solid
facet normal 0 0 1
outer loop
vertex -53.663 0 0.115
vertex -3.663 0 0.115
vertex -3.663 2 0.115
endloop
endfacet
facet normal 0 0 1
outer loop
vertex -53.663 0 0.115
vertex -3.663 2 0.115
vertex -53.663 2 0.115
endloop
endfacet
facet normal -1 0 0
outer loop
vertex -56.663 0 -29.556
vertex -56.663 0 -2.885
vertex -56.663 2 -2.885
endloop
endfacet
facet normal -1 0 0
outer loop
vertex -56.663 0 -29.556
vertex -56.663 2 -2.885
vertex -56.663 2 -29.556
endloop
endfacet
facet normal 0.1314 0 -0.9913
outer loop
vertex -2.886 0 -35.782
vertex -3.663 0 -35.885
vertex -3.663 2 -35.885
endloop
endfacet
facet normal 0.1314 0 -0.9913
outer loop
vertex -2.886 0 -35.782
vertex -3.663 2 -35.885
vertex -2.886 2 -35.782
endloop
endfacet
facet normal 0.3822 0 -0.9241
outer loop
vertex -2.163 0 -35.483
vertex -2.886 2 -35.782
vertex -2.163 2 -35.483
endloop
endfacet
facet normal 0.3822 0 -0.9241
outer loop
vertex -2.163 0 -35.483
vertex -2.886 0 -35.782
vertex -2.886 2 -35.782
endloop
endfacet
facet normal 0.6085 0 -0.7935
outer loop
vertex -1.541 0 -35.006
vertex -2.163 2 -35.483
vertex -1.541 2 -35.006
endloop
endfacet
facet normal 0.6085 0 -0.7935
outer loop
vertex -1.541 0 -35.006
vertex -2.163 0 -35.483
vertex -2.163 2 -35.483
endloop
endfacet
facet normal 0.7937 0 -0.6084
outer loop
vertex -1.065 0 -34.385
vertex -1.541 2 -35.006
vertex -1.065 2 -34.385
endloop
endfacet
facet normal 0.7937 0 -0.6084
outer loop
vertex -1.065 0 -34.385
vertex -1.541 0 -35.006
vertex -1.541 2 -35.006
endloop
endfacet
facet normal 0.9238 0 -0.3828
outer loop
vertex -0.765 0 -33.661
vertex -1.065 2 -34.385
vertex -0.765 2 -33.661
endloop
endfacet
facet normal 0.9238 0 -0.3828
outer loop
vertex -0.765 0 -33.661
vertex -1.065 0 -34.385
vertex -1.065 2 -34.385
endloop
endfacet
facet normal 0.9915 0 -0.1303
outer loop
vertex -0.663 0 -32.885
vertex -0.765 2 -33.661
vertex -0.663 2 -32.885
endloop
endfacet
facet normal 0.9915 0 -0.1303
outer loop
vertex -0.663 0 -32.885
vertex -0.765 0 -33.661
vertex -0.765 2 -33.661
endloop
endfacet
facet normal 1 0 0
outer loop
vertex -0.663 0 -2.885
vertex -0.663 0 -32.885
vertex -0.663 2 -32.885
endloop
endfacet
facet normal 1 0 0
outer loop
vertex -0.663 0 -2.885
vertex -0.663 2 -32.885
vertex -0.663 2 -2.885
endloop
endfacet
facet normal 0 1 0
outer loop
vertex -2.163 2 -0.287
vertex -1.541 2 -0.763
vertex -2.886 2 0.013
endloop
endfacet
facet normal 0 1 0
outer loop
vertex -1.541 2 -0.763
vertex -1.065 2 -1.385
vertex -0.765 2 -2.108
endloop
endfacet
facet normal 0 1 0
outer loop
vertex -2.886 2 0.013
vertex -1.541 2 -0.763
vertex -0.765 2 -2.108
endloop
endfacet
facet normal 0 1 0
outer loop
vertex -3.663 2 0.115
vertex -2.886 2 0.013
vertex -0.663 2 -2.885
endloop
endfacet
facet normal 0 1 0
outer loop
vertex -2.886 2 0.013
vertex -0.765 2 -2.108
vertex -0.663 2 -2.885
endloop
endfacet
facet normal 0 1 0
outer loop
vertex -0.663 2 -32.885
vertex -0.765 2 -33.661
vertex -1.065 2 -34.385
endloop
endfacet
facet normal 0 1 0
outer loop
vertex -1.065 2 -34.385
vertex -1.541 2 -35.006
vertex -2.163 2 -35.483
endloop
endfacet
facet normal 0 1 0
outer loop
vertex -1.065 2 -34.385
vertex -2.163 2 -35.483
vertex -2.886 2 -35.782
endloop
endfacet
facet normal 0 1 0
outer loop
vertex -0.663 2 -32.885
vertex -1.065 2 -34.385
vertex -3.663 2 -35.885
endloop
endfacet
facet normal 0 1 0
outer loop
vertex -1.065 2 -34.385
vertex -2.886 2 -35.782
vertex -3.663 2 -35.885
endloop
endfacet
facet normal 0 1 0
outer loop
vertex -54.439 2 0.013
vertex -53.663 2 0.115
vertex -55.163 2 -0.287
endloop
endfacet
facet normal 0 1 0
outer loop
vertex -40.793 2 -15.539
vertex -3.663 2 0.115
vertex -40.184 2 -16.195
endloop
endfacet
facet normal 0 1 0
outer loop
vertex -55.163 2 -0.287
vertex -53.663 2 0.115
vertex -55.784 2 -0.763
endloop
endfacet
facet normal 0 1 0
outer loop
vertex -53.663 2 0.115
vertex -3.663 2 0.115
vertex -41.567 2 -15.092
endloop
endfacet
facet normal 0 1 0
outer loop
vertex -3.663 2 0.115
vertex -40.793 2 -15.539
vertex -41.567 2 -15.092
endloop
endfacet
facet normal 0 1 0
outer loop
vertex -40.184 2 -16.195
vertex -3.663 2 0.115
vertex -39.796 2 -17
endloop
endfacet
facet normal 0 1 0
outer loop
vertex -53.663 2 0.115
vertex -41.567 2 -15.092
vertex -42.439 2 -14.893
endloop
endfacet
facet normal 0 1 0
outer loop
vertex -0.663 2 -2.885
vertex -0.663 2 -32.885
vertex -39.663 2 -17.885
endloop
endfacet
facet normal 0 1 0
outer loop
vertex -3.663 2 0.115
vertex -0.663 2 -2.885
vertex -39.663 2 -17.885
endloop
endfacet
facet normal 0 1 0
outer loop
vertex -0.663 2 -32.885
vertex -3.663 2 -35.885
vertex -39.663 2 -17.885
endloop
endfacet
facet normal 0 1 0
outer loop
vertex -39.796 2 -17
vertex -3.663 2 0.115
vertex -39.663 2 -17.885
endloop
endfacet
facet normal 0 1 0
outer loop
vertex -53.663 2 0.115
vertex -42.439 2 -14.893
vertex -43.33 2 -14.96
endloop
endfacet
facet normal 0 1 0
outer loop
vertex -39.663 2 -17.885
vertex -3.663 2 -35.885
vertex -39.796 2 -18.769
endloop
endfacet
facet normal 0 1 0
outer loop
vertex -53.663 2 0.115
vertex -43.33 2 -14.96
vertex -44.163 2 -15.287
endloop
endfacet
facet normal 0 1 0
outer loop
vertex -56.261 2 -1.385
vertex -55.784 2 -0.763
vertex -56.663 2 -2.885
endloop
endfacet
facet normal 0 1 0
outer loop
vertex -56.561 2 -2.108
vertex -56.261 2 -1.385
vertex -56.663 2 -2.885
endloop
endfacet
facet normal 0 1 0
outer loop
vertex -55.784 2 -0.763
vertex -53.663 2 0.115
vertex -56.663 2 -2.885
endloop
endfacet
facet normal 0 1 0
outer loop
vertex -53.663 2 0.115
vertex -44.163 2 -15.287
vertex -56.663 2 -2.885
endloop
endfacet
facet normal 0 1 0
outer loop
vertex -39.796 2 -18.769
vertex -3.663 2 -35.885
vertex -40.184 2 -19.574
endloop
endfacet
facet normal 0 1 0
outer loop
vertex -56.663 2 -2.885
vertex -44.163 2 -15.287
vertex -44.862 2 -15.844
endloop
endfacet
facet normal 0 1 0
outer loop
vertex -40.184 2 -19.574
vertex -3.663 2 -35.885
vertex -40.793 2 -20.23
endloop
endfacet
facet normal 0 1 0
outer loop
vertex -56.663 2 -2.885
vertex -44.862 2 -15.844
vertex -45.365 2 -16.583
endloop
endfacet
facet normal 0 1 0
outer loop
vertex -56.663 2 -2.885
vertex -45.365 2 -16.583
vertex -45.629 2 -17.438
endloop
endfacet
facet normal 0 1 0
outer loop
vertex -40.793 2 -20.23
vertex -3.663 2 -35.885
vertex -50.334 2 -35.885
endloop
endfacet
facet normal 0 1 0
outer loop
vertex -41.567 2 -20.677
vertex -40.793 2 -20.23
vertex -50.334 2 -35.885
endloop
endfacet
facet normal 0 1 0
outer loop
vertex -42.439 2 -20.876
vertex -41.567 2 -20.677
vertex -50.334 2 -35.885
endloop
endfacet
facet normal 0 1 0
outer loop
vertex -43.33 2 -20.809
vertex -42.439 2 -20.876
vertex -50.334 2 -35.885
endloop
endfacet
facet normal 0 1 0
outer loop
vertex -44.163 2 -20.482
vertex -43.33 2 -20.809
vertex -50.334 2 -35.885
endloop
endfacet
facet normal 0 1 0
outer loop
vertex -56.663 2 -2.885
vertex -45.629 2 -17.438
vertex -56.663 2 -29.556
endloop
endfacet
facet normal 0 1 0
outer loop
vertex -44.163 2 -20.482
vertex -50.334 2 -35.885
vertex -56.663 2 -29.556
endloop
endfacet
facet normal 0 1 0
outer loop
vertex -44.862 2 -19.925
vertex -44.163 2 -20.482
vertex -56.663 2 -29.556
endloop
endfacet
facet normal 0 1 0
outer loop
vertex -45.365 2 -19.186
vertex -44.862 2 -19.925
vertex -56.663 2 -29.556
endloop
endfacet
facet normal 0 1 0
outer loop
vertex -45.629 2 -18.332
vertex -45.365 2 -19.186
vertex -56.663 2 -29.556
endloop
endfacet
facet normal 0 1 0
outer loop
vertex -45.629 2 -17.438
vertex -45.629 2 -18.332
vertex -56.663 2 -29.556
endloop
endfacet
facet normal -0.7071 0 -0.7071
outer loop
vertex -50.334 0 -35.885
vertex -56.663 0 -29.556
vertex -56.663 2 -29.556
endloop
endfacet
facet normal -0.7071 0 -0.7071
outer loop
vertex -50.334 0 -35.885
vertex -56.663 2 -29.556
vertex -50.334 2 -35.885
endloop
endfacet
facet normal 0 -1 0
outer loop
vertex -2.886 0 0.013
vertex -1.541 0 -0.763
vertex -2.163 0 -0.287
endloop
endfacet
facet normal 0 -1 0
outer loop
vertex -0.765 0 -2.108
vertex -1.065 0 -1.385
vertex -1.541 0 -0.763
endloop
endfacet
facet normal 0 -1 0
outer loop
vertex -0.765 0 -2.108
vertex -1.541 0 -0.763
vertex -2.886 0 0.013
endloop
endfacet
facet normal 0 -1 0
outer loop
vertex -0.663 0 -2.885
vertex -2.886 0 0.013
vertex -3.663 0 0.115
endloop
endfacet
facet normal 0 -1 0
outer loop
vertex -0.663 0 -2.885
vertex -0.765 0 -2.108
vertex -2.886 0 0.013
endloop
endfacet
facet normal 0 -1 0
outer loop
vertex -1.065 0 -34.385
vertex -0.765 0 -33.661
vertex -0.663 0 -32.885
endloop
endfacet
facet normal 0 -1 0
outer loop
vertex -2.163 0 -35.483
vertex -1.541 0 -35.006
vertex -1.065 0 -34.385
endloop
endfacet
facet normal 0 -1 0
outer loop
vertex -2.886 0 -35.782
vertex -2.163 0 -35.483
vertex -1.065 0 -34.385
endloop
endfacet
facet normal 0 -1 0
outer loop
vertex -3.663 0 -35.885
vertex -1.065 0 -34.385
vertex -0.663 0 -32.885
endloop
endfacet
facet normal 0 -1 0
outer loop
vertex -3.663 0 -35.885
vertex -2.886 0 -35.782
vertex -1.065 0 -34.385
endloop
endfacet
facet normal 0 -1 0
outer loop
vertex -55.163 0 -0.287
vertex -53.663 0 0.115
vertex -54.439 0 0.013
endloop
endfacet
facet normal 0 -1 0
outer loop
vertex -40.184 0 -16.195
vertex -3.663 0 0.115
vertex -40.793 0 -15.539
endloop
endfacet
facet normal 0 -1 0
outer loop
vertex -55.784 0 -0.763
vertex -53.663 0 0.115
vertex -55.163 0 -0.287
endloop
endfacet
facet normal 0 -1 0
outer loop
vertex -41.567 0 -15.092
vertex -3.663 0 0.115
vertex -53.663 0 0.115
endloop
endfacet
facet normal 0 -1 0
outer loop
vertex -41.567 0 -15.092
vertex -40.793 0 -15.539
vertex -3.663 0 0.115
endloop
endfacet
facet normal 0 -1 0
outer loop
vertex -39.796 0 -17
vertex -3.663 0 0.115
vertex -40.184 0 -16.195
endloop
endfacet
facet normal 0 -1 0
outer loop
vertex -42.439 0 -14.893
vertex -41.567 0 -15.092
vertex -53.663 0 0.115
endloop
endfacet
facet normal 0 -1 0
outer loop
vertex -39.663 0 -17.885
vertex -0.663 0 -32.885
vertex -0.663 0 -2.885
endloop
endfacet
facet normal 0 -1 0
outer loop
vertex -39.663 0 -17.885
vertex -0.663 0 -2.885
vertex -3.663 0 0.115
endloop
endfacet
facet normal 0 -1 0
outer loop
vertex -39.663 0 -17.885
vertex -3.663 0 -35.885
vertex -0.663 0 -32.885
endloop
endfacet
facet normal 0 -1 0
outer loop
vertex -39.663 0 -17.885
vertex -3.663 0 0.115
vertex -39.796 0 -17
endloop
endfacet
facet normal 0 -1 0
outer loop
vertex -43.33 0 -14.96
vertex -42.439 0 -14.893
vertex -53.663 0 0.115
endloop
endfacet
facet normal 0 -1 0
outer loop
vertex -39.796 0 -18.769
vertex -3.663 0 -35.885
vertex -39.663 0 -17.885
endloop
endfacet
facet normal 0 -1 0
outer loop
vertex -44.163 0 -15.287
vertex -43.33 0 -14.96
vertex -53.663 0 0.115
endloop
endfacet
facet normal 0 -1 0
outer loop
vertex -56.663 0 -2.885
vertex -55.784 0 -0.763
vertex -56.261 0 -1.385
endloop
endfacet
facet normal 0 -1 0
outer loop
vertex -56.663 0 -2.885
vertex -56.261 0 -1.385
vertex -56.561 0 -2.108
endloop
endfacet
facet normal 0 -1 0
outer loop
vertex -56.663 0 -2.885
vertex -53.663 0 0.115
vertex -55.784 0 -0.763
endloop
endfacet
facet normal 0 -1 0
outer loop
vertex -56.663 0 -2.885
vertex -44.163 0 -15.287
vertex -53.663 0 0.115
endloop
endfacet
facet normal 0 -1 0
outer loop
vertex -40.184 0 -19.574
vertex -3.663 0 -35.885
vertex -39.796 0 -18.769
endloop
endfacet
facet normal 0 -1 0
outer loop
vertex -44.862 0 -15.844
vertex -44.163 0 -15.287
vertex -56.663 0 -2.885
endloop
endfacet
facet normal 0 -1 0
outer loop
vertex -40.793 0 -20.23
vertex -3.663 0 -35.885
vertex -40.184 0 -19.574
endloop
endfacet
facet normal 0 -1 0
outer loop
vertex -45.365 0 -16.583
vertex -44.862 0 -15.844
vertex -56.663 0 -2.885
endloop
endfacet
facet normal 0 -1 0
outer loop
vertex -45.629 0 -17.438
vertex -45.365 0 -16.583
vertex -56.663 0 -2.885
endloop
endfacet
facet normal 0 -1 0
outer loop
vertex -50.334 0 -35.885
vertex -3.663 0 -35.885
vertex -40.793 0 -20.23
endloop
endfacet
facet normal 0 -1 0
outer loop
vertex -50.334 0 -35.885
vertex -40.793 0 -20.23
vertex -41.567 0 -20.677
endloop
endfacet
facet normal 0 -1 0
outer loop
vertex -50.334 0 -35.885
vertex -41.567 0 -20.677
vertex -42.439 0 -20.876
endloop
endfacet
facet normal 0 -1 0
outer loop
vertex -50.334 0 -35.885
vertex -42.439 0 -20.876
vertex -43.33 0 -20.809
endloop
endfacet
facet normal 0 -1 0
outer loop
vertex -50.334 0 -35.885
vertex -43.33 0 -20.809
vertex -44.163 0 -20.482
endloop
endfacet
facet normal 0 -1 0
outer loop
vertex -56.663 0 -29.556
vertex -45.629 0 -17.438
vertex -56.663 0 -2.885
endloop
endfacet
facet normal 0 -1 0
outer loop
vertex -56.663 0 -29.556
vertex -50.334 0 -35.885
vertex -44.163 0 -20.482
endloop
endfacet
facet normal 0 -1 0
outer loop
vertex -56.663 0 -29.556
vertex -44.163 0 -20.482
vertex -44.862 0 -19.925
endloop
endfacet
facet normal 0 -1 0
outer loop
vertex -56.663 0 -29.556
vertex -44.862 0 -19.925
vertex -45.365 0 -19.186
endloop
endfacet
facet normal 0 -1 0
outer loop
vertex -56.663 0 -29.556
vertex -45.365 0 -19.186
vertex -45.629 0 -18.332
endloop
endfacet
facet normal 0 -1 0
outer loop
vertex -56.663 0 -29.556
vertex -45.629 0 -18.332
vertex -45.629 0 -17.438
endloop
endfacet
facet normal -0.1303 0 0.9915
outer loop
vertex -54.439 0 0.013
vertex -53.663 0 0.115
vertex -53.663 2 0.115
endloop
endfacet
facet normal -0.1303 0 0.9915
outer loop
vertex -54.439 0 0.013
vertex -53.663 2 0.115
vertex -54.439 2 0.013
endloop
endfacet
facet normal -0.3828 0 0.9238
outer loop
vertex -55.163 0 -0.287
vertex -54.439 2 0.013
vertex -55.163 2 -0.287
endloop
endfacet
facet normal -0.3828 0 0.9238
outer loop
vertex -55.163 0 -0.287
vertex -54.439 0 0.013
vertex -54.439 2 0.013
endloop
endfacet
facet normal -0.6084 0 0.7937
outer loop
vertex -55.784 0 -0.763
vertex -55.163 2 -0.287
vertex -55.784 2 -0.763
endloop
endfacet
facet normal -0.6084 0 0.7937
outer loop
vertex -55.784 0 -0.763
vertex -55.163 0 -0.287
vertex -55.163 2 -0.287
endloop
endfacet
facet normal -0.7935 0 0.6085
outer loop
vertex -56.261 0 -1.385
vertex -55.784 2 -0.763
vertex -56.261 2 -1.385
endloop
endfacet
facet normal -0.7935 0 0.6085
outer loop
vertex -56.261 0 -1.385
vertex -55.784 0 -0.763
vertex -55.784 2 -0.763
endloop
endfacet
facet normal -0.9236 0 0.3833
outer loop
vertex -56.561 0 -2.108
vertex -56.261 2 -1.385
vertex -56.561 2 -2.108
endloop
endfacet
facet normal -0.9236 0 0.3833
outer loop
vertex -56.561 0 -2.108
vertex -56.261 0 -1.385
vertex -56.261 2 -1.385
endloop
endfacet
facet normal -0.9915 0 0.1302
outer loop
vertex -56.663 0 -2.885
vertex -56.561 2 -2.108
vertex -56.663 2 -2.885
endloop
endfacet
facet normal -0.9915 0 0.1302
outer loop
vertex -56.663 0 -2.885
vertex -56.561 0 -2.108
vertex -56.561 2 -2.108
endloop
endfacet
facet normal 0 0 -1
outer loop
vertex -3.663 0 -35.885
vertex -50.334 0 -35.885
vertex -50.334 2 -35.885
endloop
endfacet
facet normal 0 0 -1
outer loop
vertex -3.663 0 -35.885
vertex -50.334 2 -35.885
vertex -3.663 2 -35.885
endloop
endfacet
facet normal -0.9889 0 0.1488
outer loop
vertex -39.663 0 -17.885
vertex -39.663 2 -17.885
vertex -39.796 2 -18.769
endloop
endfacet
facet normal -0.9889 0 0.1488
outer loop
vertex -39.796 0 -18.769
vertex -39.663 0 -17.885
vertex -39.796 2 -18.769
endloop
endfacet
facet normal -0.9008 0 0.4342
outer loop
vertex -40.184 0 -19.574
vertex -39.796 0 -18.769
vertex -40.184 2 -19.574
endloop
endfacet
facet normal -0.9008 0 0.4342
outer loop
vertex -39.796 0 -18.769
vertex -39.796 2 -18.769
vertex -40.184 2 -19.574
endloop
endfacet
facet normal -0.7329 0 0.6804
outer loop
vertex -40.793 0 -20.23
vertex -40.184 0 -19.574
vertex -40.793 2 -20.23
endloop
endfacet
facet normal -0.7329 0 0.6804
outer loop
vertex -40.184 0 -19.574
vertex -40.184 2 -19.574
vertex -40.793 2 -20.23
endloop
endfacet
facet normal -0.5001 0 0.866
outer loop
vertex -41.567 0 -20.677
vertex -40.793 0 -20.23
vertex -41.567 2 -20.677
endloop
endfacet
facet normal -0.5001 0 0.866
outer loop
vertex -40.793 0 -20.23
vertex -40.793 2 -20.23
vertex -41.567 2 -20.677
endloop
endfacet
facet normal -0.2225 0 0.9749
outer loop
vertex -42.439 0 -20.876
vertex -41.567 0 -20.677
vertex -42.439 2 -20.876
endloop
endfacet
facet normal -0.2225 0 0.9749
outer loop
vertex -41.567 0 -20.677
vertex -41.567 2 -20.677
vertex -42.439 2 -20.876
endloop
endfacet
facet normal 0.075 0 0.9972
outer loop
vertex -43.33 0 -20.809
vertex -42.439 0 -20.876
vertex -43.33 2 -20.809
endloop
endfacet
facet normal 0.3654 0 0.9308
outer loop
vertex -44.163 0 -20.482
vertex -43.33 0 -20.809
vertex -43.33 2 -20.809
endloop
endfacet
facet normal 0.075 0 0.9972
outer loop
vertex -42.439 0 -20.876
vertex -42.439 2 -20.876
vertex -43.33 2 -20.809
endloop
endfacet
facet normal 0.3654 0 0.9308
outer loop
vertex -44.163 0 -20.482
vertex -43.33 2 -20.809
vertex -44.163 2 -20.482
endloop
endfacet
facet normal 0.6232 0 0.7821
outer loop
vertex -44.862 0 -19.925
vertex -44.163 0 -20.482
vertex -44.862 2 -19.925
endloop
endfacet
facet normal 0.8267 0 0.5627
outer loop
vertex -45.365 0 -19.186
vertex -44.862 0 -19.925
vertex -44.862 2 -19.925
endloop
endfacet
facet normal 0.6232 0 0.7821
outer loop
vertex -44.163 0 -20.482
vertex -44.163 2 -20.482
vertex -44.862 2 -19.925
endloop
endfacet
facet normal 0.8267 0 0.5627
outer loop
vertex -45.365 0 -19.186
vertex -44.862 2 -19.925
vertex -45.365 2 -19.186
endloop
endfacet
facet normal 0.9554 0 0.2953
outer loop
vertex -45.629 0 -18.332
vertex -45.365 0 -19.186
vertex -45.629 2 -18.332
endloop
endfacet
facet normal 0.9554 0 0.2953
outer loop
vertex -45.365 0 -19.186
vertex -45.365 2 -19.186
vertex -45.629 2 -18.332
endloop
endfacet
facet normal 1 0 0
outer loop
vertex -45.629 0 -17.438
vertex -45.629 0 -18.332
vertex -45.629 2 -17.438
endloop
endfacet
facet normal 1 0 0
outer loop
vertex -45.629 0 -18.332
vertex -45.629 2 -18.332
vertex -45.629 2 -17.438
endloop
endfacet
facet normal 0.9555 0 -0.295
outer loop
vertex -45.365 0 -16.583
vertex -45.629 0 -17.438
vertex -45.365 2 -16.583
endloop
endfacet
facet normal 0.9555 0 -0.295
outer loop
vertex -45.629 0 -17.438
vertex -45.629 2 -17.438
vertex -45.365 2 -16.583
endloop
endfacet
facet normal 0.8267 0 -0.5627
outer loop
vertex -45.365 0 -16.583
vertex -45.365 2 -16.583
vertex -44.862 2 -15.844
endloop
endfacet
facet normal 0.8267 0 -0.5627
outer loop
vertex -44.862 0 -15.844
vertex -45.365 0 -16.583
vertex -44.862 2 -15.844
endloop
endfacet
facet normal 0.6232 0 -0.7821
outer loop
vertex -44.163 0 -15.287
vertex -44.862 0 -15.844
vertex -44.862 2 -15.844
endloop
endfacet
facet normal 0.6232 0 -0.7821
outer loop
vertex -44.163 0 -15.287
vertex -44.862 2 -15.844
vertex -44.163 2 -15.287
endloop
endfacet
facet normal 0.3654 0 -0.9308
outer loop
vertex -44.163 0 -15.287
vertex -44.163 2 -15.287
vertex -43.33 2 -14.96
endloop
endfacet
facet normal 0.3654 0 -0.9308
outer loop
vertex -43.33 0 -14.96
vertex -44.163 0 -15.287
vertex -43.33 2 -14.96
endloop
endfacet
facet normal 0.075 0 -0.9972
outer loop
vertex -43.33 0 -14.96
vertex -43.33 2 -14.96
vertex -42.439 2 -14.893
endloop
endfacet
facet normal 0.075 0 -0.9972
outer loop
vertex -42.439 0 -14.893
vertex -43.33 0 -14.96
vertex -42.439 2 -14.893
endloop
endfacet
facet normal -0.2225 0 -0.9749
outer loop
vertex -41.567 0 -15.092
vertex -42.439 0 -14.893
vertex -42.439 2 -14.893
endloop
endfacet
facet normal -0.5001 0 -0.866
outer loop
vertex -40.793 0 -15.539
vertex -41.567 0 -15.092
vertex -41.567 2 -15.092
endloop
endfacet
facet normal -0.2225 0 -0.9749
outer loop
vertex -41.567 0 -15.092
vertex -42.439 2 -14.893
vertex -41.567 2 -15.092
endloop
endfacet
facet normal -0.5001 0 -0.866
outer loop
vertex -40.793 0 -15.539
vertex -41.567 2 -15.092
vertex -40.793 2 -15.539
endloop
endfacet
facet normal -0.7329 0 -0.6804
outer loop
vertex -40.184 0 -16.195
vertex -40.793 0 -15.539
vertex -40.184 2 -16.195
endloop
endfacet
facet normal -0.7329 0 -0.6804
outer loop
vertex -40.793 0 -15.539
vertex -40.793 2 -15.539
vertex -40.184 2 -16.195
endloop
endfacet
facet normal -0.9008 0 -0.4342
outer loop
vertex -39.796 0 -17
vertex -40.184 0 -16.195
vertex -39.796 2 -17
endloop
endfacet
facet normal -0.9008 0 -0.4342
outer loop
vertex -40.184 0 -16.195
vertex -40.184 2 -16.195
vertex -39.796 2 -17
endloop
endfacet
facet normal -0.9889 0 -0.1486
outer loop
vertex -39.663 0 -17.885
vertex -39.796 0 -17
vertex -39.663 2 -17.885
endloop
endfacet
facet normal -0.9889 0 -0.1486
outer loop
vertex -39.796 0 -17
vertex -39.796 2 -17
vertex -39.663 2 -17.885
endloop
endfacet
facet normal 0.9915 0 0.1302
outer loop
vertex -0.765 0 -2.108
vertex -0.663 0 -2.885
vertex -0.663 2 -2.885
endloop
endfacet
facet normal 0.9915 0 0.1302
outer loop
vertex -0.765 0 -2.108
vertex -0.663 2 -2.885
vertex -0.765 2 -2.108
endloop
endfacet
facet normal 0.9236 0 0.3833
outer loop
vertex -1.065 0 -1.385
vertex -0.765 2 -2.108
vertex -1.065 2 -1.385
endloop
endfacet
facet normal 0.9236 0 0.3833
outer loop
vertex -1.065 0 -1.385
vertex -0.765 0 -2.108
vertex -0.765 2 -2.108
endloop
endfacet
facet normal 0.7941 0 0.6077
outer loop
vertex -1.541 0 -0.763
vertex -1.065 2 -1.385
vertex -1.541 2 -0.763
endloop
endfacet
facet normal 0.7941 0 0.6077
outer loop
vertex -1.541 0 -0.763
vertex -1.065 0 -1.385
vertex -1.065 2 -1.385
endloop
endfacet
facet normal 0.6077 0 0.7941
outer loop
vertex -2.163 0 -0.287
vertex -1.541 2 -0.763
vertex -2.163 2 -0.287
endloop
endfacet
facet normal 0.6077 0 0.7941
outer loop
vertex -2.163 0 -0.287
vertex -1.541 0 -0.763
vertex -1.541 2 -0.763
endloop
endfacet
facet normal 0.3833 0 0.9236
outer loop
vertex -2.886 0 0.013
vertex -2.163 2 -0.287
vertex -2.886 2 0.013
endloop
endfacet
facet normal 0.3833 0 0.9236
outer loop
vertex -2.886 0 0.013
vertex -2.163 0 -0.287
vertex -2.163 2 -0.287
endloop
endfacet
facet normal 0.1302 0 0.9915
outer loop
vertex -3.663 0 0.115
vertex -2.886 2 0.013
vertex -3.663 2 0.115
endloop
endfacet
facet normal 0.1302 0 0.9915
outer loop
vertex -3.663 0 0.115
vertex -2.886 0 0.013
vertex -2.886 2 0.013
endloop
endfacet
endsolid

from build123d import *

# Parameters (mm, degrees)
BOSS_EXTRUDE1_DEPTH = 2
SKETCH3_R           = 2.999590147
CUT_EXTRUDE1_DEPTH  = 2


with BuildPart() as part:
    # Sketch1 → Boss-Extrude1 (new body)
    with BuildSketch(Plane(origin=(0, 0, 0), x_dir=(1, 0, 0), z_dir=(0, 1, 0))):
        with BuildLine():
            Line((-56.662746608, 29.55617923), (-50.334319483, 35.884606354))
            Line((-50.334319483, 35.884606354), (-3.662746608, 35.884606354))
            ThreePointArc((-3.662746608, 35.884606354), (-1.541426264, 35.005926698), (-0.662746608, 32.884606354))
            Line((-0.662746608, 32.884606354), (-0.662746608, 2.884606354))
            ThreePointArc((-0.662746608, 2.884606354), (-1.541426264, 0.763286011), (-3.662746608, -0.115393646))
            Line((-3.662746608, -0.115393646), (-53.662746608, -0.115393646))
            ThreePointArc((-53.662746608, -0.115393646), (-55.784066951, 0.763286011), (-56.662746608, 2.884606354))
            Line((-56.662746608, 2.884606354), (-56.662746608, 29.55617923))
        make_face()
    extrude(amount=BOSS_EXTRUDE1_DEPTH)

    # Sketch3 → Cut-Extrude1 (cut)
    with BuildSketch(Plane(origin=(0, 2, 0), x_dir=(1, 0, 0), z_dir=(0, 1, 0))):
        with Locations((-42.662746608, 17.884606354)):
            Circle(SKETCH3_R)
    extrude(amount=-CUT_EXTRUDE1_DEPTH, mode=Mode.SUBTRACT)


solid = part.part
